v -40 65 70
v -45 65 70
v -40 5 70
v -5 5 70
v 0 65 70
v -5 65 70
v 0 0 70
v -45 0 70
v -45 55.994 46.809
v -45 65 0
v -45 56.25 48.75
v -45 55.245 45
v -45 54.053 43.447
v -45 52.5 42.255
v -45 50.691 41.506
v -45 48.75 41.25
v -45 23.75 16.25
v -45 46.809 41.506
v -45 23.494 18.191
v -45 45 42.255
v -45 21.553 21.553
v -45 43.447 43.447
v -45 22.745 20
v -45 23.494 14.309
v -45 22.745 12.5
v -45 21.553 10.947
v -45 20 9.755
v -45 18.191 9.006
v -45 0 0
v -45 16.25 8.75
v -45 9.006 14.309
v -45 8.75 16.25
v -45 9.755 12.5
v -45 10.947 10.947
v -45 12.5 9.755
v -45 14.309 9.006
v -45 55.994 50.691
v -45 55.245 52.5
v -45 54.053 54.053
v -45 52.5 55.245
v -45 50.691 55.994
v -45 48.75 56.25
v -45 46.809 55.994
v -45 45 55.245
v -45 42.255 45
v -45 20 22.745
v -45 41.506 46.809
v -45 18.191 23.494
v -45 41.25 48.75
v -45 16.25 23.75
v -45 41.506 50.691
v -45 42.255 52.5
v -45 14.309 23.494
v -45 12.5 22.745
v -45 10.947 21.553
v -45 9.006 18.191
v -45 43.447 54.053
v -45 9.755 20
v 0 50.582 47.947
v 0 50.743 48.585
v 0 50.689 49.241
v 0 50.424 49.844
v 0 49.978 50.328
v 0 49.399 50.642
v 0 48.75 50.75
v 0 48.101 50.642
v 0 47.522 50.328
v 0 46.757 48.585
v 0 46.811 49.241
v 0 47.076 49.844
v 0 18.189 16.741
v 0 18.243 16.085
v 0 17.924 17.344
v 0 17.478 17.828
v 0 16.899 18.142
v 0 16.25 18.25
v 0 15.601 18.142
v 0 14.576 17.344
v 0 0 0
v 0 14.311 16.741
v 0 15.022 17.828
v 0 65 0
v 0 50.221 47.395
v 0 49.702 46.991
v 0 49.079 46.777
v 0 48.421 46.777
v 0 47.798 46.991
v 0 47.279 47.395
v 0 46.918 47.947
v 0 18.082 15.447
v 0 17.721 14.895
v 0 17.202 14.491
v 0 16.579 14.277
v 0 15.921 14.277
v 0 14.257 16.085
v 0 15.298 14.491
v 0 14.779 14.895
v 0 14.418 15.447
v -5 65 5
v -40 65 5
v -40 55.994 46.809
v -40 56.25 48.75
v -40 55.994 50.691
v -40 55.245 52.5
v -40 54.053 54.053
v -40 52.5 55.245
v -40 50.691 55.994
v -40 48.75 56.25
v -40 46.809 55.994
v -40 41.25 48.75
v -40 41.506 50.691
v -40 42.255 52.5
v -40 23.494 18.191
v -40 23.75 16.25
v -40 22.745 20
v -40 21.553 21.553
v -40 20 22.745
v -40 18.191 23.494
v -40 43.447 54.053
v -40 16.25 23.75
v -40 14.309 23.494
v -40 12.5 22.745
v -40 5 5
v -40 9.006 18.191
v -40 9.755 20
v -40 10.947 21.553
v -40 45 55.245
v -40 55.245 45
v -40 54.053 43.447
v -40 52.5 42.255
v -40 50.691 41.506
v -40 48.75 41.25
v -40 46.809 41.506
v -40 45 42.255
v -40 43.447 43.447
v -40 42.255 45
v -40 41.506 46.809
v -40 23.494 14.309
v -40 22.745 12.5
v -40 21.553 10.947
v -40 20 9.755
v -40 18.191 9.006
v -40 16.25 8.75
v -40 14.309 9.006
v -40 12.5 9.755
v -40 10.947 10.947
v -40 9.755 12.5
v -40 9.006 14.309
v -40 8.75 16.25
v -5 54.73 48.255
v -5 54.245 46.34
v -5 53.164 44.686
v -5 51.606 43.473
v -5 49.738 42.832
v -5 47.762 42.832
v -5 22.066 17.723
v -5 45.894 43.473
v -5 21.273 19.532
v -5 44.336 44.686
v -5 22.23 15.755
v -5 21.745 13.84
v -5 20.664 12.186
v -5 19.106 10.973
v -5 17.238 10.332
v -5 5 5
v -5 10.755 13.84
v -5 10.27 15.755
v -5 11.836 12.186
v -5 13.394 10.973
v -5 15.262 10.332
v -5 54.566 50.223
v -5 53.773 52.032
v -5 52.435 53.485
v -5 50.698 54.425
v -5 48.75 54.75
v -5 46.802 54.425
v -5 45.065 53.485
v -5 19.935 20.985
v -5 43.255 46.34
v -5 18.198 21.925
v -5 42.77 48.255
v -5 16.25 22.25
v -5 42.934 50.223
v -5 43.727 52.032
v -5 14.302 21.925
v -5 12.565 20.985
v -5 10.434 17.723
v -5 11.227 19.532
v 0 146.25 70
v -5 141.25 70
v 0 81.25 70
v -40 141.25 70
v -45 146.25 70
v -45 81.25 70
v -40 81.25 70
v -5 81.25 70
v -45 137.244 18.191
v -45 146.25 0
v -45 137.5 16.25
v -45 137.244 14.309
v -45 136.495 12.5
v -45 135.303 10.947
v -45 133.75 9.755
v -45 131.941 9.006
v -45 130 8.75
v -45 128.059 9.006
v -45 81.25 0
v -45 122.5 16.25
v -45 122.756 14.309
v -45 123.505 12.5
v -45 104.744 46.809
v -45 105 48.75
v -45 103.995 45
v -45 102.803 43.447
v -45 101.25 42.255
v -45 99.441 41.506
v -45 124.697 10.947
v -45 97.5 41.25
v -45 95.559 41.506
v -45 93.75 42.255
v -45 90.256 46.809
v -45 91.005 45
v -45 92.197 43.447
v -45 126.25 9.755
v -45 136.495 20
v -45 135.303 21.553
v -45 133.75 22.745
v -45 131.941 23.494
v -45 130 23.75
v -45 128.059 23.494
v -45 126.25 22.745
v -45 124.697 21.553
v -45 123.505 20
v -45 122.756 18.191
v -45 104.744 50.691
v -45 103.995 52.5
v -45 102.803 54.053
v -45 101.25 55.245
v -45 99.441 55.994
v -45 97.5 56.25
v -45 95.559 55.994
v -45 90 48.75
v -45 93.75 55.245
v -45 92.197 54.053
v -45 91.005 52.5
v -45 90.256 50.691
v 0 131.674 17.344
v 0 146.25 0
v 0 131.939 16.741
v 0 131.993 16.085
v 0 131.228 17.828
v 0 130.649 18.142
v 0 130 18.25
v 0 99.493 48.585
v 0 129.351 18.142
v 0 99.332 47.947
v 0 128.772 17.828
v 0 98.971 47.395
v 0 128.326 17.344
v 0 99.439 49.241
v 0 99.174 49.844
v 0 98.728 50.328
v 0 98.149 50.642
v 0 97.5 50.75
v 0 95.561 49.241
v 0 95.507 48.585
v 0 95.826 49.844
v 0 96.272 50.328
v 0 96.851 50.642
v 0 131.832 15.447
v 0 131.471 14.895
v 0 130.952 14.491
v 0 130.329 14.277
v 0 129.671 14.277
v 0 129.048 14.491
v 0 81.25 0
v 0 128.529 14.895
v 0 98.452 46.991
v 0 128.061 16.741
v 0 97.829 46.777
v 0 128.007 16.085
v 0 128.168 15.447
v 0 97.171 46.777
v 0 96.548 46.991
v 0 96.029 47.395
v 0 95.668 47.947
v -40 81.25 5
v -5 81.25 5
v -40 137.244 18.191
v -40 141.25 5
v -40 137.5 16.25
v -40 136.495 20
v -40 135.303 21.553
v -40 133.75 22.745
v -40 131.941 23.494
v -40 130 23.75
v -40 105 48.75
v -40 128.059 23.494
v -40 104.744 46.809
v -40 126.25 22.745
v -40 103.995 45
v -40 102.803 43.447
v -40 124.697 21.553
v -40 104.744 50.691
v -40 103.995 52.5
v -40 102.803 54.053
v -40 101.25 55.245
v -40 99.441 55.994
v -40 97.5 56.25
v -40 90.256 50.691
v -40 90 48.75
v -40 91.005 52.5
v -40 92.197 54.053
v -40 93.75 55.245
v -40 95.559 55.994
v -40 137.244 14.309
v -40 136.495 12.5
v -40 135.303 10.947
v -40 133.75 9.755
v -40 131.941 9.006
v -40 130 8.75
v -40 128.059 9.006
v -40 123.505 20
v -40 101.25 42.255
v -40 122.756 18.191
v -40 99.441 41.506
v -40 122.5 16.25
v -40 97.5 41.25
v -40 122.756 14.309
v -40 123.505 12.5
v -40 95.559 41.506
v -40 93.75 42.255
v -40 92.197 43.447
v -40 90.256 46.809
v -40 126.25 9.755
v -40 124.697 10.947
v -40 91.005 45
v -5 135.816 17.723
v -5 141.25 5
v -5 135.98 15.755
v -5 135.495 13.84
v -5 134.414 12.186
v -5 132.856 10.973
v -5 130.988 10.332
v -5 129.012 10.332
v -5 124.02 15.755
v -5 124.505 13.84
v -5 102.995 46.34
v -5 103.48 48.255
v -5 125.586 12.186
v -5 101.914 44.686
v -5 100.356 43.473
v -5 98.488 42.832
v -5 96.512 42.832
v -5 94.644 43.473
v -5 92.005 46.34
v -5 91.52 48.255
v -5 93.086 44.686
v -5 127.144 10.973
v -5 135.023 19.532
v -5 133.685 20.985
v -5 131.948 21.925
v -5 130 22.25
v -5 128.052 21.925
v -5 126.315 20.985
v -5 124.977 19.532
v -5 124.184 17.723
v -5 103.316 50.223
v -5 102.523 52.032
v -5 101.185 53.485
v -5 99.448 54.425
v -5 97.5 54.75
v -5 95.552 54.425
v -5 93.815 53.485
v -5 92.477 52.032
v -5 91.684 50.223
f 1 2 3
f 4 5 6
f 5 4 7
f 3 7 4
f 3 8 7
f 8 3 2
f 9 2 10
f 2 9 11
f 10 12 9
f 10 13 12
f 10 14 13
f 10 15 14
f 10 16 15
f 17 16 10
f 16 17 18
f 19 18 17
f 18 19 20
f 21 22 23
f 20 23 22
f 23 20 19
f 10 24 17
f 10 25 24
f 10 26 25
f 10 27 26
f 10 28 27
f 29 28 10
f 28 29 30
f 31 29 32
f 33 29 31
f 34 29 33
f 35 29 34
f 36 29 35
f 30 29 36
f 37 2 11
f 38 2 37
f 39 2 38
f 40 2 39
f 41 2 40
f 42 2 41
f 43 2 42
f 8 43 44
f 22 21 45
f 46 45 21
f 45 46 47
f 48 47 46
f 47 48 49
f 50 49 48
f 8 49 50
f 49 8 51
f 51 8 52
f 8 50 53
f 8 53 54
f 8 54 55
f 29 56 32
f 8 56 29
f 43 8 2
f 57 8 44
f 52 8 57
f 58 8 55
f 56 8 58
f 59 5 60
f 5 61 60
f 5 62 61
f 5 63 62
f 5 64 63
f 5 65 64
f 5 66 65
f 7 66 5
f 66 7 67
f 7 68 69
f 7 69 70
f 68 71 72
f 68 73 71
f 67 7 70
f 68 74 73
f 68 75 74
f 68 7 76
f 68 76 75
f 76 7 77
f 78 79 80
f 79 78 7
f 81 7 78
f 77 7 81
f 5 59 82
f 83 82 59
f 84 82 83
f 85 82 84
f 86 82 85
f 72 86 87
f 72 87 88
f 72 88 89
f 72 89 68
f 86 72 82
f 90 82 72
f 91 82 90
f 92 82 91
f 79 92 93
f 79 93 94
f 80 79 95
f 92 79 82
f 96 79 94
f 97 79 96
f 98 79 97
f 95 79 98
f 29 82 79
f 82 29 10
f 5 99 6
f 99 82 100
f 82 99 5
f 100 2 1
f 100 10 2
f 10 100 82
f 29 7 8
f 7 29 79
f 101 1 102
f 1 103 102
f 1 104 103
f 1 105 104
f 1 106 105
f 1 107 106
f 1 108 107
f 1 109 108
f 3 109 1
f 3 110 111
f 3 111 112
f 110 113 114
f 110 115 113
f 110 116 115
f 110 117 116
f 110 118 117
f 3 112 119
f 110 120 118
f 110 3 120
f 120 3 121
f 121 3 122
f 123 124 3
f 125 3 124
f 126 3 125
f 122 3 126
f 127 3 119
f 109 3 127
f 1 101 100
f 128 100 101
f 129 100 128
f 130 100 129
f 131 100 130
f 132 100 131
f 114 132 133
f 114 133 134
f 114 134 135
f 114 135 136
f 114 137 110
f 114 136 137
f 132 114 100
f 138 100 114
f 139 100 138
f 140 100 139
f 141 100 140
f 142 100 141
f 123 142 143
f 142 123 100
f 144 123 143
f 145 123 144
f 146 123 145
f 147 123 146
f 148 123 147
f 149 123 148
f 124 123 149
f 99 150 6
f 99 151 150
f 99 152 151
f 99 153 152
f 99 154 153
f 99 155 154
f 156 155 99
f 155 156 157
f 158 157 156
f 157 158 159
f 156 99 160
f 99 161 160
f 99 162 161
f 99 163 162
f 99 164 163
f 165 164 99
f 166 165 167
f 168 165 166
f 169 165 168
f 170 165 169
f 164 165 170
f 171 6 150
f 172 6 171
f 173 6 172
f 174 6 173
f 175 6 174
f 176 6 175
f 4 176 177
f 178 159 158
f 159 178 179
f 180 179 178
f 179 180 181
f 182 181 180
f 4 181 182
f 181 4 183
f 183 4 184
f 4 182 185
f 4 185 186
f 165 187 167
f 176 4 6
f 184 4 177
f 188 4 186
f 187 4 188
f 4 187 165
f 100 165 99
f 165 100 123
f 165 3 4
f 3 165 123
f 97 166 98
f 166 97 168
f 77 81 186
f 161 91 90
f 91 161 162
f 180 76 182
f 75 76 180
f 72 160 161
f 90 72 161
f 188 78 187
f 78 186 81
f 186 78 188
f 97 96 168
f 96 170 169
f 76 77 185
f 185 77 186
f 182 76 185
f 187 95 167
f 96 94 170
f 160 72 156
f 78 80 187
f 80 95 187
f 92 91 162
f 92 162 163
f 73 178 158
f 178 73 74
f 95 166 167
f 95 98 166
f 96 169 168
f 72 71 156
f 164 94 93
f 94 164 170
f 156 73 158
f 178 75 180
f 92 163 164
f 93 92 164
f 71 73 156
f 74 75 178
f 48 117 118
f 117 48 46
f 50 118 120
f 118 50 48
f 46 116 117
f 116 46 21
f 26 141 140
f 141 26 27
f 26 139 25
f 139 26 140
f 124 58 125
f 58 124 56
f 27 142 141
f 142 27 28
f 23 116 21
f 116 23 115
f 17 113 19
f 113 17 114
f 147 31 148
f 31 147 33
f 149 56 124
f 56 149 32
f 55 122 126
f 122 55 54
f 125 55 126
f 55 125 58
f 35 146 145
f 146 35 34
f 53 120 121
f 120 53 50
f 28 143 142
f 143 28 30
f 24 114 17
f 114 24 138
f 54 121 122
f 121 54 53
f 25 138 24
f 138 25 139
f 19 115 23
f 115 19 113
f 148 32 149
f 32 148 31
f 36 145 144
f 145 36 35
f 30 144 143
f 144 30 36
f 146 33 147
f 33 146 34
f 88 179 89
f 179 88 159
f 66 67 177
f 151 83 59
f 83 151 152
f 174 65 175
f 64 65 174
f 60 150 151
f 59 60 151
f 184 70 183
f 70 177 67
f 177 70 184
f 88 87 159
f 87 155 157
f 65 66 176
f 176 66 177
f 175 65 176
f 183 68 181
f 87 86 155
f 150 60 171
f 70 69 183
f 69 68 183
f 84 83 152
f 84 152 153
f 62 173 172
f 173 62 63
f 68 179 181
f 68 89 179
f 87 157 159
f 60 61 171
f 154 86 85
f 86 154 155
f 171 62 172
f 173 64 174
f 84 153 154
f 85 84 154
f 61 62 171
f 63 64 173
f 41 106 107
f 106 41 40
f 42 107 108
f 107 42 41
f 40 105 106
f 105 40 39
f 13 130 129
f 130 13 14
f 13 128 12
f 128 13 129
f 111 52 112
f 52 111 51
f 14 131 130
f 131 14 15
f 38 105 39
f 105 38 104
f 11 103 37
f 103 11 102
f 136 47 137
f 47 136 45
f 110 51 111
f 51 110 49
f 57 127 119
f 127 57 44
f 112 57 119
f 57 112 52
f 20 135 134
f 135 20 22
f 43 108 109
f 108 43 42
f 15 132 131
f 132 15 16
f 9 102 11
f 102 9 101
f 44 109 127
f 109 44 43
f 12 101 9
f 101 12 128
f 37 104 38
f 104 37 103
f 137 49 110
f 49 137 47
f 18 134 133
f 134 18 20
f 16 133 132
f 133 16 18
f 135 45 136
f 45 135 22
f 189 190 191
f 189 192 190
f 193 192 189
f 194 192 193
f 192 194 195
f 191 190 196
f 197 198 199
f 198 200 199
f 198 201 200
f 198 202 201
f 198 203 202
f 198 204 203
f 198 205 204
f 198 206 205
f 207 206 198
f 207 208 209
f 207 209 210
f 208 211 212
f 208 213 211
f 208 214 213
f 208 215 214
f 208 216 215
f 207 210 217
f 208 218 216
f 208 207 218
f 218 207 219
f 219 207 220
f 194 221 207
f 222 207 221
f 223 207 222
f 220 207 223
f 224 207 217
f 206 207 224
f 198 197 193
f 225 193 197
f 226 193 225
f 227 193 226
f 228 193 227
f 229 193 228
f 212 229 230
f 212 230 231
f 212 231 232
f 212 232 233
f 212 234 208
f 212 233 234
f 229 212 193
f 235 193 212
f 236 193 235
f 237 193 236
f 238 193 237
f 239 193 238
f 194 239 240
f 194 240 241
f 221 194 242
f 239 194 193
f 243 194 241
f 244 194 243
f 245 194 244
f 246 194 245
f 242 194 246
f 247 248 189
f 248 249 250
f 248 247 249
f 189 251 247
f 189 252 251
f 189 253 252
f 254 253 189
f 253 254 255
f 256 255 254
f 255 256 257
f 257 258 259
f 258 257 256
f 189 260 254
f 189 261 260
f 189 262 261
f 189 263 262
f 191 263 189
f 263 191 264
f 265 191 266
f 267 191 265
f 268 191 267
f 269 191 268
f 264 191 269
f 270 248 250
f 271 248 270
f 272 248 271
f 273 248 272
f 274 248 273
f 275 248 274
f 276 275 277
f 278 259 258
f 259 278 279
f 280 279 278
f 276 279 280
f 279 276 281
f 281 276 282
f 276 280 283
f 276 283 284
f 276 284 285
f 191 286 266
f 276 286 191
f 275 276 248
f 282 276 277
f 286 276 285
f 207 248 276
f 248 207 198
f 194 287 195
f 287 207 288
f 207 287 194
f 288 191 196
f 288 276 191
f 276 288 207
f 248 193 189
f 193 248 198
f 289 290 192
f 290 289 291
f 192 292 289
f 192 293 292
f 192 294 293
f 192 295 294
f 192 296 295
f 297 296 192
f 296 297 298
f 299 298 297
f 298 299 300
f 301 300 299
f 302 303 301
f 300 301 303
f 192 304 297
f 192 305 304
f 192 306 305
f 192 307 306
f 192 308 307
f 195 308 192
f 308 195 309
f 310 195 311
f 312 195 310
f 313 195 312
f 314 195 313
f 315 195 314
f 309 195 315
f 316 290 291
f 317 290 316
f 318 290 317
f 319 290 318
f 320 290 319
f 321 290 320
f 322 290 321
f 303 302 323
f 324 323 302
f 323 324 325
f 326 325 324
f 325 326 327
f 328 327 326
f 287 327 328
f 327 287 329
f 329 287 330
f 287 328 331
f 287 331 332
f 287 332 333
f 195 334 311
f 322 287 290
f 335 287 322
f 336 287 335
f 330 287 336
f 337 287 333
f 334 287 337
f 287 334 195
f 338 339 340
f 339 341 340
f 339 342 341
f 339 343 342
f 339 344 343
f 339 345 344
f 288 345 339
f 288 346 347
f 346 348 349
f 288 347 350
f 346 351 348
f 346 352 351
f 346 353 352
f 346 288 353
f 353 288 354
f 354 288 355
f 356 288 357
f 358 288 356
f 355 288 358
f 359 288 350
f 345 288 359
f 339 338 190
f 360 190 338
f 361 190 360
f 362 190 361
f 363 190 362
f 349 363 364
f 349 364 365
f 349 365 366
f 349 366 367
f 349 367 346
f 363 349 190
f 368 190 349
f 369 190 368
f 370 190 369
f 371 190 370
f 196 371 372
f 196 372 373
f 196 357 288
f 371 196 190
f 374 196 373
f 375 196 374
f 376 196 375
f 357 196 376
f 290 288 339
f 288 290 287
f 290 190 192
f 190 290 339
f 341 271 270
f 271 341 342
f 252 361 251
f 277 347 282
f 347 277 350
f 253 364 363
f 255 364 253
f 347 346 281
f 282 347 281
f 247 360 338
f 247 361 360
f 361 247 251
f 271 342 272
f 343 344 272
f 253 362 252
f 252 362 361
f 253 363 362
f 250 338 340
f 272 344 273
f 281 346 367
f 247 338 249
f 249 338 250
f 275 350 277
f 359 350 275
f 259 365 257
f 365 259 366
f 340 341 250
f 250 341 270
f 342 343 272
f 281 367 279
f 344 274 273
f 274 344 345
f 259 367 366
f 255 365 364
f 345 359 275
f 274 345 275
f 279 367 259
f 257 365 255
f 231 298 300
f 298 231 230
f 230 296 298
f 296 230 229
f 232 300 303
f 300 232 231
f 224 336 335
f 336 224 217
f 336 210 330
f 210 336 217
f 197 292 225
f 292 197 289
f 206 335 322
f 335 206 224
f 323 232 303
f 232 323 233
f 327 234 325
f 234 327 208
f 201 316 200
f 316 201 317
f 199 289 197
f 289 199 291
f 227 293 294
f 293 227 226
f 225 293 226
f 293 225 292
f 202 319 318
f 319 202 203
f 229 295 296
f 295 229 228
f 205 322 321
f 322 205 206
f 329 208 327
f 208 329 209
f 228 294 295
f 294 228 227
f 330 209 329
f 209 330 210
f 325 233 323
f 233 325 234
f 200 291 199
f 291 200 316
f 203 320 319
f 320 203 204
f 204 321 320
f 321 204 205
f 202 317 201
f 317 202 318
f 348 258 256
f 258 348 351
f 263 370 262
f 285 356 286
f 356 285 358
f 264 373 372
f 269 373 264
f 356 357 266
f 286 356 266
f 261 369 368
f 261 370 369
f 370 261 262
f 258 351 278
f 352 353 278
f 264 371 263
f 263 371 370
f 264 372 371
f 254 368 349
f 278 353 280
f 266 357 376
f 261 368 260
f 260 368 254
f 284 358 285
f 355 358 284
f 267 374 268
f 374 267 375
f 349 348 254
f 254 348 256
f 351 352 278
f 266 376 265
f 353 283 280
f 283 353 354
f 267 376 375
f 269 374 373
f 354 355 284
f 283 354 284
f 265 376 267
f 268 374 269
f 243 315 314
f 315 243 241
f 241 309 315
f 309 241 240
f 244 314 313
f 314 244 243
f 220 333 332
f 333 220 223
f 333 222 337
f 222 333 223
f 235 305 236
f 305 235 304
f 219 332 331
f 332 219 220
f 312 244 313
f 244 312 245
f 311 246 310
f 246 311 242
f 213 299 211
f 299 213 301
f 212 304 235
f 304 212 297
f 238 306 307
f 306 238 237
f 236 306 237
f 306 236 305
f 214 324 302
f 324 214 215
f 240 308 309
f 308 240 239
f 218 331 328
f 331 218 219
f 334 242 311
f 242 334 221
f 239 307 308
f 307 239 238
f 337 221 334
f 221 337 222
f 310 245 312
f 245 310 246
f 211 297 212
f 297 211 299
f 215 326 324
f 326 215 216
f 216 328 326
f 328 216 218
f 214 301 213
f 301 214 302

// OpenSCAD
height=65;
width=65;
depth=35;

wallThickness=5;

screwDiameter=4;
screwHoleAccess = 15;

module screwHole () {
    translate([0,0,wallThickness/2])
        cylinder(h = wallThickness, d1 = screwDiameter, d2 = screwDiameter*3, center = true);
    translate([0,0,depth]){
        cylinder(h=(wallThickness*2), d=screwHoleAccess);
    };
}



module corner() {
    rotate([0,270,0]) {
        difference() {
            difference() {
                cube([height+wallThickness,width,depth+2*wallThickness]);
                translate([wallThickness,wallThickness,wallThickness]) {
                    cube([height,width,depth]);
                }
            }
            union() {
                translate([height/4,width/4,0]){
                    screwHole();
                }
                translate([height*3/4,width*3/4,0]){
                    screwHole();
                };
            }
        }
    }
}

corner();
translate([0,width*2.25,0]) {
    mirror([0,1,0]) {
        corner();
    }
}

//screwHole();
